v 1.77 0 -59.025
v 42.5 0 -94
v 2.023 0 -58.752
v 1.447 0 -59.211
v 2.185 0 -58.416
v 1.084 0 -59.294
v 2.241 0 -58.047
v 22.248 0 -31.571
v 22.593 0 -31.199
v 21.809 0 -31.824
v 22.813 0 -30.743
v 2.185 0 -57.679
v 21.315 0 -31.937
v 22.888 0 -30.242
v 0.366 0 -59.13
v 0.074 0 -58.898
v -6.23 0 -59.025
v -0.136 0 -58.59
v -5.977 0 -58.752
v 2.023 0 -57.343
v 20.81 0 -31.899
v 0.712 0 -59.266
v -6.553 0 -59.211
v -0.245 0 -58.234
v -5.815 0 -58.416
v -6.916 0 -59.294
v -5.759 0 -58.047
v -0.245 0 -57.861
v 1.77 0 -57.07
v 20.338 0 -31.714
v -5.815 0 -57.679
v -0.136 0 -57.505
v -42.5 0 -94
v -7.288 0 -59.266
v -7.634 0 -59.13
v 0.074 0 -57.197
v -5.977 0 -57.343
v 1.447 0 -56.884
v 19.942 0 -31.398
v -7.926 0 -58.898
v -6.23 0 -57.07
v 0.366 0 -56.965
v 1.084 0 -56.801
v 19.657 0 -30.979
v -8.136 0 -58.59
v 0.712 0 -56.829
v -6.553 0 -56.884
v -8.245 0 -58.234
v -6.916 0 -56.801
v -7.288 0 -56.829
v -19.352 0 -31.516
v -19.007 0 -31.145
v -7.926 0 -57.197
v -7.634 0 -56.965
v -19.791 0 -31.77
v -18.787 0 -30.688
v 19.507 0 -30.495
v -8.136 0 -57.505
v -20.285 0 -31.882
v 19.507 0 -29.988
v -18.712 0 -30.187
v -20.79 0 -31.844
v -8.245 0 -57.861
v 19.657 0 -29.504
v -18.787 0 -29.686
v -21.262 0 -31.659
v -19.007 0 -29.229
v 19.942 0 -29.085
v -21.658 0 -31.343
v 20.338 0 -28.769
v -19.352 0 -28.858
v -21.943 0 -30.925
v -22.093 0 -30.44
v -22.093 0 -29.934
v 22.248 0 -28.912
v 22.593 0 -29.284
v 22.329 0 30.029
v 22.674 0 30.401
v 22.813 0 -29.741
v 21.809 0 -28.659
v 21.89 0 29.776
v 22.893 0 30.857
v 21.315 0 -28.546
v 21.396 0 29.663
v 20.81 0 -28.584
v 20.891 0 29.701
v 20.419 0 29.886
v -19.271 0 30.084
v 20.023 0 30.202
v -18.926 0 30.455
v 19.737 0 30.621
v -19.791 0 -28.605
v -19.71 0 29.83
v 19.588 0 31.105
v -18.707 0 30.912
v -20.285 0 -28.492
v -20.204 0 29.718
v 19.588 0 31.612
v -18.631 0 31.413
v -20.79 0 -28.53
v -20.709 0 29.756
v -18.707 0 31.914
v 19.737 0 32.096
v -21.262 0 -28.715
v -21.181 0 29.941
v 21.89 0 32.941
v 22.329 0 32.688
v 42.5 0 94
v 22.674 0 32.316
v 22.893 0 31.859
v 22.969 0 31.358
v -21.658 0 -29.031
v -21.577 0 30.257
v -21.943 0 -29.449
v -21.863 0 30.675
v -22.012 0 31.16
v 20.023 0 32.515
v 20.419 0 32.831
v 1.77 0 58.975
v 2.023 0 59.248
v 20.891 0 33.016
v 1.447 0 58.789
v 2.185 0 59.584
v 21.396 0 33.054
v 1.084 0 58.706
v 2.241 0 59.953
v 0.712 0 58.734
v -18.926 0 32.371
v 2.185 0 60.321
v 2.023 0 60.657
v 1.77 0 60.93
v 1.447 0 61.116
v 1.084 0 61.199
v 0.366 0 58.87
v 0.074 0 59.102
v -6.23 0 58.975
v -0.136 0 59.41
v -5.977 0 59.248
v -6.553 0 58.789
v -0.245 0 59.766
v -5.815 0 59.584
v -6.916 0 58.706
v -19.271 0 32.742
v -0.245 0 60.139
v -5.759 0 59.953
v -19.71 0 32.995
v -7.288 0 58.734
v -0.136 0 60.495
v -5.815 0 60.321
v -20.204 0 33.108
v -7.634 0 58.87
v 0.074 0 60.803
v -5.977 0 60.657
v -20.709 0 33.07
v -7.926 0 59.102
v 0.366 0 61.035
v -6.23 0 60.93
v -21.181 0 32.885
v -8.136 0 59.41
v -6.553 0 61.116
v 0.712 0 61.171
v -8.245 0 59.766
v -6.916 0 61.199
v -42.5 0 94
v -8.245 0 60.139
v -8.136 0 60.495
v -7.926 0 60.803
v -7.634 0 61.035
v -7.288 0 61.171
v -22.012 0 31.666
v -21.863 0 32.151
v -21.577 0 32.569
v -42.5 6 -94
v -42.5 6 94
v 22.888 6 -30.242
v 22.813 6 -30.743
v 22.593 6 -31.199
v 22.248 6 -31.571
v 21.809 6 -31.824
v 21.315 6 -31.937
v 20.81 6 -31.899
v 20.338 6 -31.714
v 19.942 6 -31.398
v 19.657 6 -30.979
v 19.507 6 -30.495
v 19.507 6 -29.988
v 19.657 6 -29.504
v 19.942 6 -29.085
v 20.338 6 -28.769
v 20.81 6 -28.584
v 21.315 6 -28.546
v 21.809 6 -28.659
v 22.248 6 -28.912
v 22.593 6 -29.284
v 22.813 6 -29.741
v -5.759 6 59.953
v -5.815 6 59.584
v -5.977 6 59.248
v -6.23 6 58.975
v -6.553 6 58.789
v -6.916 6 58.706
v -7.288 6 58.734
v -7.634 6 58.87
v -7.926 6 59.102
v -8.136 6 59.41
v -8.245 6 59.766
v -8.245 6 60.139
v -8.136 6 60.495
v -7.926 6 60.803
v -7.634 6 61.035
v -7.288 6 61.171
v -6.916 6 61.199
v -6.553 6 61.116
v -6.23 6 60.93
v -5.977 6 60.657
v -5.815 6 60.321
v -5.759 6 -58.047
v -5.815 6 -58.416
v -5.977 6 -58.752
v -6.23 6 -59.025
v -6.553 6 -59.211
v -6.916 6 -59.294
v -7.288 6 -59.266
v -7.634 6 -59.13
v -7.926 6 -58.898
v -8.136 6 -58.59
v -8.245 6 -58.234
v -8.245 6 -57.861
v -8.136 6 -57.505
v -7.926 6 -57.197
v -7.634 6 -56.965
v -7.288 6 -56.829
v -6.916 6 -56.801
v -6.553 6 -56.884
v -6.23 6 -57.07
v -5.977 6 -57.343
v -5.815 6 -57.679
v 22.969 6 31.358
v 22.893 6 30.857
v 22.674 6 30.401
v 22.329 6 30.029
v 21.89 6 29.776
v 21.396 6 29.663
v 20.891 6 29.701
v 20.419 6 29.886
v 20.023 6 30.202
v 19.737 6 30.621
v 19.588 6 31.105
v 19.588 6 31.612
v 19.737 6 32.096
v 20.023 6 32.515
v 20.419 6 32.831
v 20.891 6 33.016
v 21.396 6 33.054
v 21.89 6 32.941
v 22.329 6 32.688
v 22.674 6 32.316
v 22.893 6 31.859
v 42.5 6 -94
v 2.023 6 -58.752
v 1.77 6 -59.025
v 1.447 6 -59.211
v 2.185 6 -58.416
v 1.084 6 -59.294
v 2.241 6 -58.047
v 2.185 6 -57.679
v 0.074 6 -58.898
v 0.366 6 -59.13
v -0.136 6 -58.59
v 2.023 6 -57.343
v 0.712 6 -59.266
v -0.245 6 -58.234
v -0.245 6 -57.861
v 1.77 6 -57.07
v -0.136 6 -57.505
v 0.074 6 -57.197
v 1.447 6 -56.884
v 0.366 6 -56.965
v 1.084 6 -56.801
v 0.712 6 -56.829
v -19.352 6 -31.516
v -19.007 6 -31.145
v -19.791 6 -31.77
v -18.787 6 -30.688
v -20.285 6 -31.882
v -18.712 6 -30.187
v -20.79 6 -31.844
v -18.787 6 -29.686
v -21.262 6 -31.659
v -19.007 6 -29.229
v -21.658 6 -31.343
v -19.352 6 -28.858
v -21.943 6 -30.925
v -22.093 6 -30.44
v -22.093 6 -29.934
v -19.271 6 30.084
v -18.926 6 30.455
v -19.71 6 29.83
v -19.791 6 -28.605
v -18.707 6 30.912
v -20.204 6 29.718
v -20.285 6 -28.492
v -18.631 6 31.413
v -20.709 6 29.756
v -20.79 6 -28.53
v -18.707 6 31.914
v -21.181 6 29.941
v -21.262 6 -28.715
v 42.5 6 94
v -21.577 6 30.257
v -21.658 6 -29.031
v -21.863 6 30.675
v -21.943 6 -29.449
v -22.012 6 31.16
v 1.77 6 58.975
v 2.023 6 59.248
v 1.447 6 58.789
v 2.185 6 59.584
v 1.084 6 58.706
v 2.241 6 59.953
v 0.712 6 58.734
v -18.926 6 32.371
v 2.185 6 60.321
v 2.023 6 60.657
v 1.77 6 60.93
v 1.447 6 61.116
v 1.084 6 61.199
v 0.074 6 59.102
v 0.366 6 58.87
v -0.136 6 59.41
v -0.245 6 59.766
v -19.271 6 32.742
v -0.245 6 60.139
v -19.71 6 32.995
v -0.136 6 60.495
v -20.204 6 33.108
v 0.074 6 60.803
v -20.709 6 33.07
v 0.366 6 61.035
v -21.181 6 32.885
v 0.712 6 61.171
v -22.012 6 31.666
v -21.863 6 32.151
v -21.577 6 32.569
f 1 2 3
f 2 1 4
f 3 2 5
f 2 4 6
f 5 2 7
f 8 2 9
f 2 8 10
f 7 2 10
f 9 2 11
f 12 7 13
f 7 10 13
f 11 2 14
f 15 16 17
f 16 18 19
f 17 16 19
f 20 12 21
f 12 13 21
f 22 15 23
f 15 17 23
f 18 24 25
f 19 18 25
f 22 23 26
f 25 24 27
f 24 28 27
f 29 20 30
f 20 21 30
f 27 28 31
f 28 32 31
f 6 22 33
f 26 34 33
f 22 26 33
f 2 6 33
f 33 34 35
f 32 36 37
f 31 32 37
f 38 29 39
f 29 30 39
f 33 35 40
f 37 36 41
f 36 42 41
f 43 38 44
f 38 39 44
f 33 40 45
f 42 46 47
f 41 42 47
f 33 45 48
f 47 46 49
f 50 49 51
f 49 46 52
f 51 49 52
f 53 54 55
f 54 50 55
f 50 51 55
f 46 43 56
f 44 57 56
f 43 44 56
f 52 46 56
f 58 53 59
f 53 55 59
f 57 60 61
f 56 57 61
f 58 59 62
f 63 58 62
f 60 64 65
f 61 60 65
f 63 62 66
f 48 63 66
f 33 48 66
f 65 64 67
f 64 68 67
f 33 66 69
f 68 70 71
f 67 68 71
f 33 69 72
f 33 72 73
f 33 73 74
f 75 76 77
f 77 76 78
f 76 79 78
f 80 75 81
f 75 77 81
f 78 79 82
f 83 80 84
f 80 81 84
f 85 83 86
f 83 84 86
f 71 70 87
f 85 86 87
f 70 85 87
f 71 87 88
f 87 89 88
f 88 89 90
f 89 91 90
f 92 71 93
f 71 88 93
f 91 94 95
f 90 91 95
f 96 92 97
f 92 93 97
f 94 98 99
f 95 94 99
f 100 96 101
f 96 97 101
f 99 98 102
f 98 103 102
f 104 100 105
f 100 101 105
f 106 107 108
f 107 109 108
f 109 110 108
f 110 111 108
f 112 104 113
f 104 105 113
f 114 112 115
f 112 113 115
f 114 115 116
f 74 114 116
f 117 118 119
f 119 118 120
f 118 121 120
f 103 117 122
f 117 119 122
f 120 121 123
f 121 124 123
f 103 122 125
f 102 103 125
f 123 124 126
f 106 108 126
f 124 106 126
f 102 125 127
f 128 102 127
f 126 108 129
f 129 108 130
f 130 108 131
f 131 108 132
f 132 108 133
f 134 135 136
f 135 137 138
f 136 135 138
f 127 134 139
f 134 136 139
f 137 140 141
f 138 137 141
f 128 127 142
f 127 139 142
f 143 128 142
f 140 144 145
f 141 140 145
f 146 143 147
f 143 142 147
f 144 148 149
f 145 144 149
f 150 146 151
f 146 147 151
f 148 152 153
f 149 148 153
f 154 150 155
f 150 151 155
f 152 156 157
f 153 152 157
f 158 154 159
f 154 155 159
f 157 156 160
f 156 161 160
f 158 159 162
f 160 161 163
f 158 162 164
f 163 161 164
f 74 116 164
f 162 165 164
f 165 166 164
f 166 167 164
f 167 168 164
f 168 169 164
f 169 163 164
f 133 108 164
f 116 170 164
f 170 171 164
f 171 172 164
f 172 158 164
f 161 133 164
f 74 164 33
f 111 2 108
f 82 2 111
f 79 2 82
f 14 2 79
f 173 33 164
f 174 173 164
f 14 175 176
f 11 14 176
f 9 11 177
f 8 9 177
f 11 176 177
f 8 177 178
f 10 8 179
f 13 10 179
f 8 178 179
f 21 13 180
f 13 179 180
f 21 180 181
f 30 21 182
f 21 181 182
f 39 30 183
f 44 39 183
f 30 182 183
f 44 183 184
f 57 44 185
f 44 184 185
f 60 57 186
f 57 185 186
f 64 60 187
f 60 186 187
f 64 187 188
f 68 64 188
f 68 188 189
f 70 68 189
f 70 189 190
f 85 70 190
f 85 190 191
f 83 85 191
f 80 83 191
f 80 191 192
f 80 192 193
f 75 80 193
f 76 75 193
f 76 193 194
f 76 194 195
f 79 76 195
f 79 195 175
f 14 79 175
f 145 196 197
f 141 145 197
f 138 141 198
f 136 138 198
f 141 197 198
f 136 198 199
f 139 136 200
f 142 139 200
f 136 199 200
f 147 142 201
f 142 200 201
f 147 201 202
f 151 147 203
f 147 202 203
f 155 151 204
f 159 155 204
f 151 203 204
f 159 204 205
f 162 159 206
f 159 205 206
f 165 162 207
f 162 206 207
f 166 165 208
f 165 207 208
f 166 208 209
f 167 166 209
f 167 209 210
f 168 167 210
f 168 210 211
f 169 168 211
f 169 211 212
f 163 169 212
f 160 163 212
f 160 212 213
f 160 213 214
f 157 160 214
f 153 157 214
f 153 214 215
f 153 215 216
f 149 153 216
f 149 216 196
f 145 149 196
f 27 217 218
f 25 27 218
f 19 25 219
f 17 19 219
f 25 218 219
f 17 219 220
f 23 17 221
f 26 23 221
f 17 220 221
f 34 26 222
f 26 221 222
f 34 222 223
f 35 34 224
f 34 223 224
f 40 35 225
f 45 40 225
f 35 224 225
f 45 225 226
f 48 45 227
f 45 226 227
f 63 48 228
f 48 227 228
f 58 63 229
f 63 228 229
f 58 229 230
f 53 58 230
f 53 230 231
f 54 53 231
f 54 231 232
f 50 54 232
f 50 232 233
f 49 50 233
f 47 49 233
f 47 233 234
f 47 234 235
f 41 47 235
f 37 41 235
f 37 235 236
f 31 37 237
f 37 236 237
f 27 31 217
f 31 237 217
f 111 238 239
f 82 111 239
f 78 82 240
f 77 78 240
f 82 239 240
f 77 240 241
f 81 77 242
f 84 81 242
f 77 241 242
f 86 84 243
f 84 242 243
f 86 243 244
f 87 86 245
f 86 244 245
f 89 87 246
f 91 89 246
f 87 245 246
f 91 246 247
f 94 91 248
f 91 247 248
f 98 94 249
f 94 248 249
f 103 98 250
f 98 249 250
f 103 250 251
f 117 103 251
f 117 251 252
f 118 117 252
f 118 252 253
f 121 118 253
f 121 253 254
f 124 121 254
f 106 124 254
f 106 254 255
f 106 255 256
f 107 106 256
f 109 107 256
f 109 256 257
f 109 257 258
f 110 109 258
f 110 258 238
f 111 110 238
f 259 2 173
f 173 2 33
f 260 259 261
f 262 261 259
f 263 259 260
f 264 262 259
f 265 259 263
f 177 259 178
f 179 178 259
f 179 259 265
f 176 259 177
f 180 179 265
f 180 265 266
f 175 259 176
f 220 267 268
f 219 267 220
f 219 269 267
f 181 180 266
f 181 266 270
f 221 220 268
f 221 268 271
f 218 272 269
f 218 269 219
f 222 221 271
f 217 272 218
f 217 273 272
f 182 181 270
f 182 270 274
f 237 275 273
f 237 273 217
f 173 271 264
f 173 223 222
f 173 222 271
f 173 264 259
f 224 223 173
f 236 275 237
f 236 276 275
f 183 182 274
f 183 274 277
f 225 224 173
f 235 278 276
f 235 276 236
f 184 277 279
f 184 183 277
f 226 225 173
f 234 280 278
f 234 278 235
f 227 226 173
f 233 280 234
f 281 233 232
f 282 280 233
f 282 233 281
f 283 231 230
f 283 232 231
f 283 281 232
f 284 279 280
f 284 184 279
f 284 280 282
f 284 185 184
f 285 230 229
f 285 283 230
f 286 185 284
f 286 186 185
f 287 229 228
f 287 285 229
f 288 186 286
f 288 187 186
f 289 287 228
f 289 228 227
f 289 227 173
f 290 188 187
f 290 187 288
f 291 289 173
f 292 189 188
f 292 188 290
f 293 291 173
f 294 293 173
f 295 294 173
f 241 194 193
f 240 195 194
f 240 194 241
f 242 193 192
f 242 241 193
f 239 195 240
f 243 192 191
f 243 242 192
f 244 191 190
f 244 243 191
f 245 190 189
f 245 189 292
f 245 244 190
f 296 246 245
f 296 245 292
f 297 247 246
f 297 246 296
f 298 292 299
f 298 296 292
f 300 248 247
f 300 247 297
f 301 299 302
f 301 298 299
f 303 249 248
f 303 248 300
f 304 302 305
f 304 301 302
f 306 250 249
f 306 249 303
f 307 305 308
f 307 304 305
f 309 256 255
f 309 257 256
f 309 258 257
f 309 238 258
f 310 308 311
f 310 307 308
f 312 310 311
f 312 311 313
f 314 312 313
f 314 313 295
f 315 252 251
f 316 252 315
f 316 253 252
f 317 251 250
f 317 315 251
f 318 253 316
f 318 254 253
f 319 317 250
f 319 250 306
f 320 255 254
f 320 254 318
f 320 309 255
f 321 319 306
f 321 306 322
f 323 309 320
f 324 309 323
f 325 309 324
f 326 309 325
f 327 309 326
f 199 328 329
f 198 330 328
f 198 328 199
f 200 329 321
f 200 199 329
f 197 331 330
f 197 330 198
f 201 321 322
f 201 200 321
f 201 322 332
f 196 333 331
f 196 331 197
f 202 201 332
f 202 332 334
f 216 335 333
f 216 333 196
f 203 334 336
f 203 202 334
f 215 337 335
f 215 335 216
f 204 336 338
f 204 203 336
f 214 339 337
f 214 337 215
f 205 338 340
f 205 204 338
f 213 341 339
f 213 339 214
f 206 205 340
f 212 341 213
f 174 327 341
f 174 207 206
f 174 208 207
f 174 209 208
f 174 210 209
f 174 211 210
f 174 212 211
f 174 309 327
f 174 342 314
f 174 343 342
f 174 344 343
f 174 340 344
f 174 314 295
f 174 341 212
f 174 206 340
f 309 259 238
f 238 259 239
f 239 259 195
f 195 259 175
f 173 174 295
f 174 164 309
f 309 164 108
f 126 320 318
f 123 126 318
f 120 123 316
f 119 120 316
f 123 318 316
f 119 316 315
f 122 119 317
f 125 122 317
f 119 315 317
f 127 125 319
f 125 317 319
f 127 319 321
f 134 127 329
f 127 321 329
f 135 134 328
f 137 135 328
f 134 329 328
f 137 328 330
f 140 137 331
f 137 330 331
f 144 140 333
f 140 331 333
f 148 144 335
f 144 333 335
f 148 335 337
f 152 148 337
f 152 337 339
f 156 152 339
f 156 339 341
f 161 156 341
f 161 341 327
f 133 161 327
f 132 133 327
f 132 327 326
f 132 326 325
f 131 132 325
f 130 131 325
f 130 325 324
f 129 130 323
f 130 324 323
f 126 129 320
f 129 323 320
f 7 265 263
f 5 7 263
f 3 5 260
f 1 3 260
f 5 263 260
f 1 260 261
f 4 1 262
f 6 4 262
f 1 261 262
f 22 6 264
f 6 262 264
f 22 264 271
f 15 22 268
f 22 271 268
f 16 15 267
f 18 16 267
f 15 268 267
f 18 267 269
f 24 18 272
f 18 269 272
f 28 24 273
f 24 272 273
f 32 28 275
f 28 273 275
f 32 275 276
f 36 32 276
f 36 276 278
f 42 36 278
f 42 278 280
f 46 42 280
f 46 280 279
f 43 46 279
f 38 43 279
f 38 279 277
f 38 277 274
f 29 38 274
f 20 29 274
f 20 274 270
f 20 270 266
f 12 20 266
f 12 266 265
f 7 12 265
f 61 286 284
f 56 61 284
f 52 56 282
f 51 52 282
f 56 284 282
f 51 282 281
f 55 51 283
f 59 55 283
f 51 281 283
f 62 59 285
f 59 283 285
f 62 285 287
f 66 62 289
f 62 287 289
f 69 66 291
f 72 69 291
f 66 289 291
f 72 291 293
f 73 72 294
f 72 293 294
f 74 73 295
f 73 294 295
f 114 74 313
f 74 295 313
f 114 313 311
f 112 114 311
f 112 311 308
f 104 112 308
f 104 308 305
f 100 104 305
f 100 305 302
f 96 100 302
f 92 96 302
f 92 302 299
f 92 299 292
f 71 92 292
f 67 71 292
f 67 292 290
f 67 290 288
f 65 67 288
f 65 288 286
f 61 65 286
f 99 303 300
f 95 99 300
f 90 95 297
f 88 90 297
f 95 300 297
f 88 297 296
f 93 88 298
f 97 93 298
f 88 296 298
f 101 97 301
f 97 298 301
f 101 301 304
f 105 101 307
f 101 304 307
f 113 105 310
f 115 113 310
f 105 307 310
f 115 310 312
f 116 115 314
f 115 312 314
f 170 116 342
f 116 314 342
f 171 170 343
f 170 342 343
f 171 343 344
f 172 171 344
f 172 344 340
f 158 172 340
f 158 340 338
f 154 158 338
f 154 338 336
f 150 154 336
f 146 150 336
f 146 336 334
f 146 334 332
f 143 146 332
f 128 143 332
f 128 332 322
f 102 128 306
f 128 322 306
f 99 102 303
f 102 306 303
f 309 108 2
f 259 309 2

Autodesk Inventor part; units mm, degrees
ref_plane "YZ Plane" through (0, 0, 0) normal (1, 0, 0) x (0, 1, 0)
ref_plane "XZ Plane" through (0, 0, 0) normal (0, 1, 0) x (-1, 0, 0)
ref_plane "XY Plane" through (0, 0, 0) normal (0, 0, 1) x (1, 0, 0)
ref_plane "작업 평면1" through (-11.501, -90.6951, 25.5) normal (0, 0, 1) x (0, 1, 0)
ref_plane "작업 평면2" through (-154.4039, 73.8066, -132.8958) normal (0, 0, 1) x (0, 1, 0)
sketch "스케치12" plane through (0, 0, 0) normal (0, 1, 0) x (-1, 0, 0)
  line L0 (-42.5, -94) -> (42.5, -94)
  line L1 (42.5, -94) -> (42.5, 94)
  line L2 (42.5, 94) -> (-42.5, 94)
  line L3 (-42.5, 94) -> (-42.5, -94)
  line L4 (-42.5, -94) -> (42.5, 94) construction
  line L5 (42.5, -94) -> (-42.5, 94) construction
  point P0 (0, 0)
  dimension "d71" = 85
  dimension "d72" = 188
extrude "돌출11" add sketch "스케치12" along normal blind 6
sketch "스케치15" plane through (0, 6, 0) normal (0, 1, 0) x (1, 0, 0)
  circle A0 centre (0.9906, -59.9526) radius 1.25 projected
  circle A1 centre (-7.0094, -59.9526) radius 1.25 projected
  line L0 (-13.0094, -54.9526) -> (6.9906, -54.9526) projected
  line L1 (-13.0094, -54.9526) -> (-13.0094, -64.9526) projected
  line L2 (6.9906, -64.9526) -> (-13.0094, -64.9526) projected
  line L3 (6.9906, -54.9526) -> (6.9906, -64.9526) projected
  circle A2 centre (-7.0094, 58.0474) radius 1.25 projected
  circle A3 centre (0.9906, 58.0474) radius 1.25 projected
  line L4 (6.9906, 53.0474) -> (-13.0094, 53.0474) projected
  line L5 (6.9906, 53.0474) -> (6.9906, 63.0474) projected
  line L6 (-13.0094, 63.0474) -> (6.9906, 63.0474) projected
  line L7 (-13.0094, 53.0474) -> (-13.0094, 63.0474) projected
  point P0 (0, 0)
extrude "돌출14" cut sketch "스케치15" against normal blind 10 contours A0 | A1 | A2 | A3
sketch "스케치16" plane through (0, 6, 0) normal (0, 1, 0) x (1, 0, 0)
  circle A0 centre (-20.331, -31.4129) radius 1.6 projected
  circle A1 centre (-20.4117, 30.1871) radius 1.6 projected
  circle A2 centre (21.269, -31.3584) radius 1.6 projected
  circle A3 centre (21.1883, 30.2416) radius 1.6 projected
  line L0 (-24.6171, 34.3816) -> (-24.5254, -35.6184) projected
  line L1 (-24.5254, -35.6184) -> (25.4745, -35.5529) projected
  line L2 (25.4745, -35.5529) -> (25.3828, 34.4471) projected
  line L3 (25.3828, 34.4471) -> (-24.6171, 34.3816) projected
  line L4 (-3.012, -16.0318) -> (-3.013, -15.2211) projected
  line L5 (-3.013, -15.2211) -> (2.3653, -15.2141) projected
  line L6 (2.3653, -15.2141) -> (2.3626, -13.1675) projected
  line L7 (2.3626, -13.1675) -> (3.0843, -13.1666) projected
  line L8 (3.0843, -13.1666) -> (3.0907, -18.0703) projected
  line L9 (3.0907, -18.0703) -> (2.369, -18.0713) projected
  line L10 (2.369, -18.0713) -> (2.3663, -16.0248) projected
  line L11 (2.3663, -16.0248) -> (-3.012, -16.0318) projected
  spline S0 degree 2 poles (-2.5863, -8.9228) (-2.8733, -8.6315) (-3.1512, -7.8607) (-3.1519, -7.2972) knots 0 0 0 1 2 2 2 projected
  spline S1 degree 2 poles (-3.1519, -7.2972) (-3.1526, -6.7584) (-2.8719, -5.9572) (-2.5905, -5.6751) knots 0 0 0 1 2 2 2 projected
  spline S2 degree 2 poles (-2.5905, -5.6751) (-2.2746, -5.3534) (-1.3851, -5.0902) (-0.7326, -5.0893) knots 0 0 0 1 2 2 2 projected
  line L12 (-0.7326, -5.0893) -> (3.0737, -5.0844) projected
  line L13 (3.0737, -5.0844) -> (3.0748, -5.895) projected
  line L14 (3.0748, -5.895) -> (-0.7315, -5.9) projected
  spline S3 degree 2 poles (-0.7315, -5.9) (-1.1567, -5.9006) (-1.7299, -6.0101) (-1.9621, -6.1636) knots 0 0 0 1 2 2 2 projected
  spline S4 degree 2 poles (-1.9621, -6.1636) (-2.209, -6.3271) (-2.4604, -6.891) (-2.4599, -7.2963) knots 0 0 0 1 2 2 2 projected
  spline S5 degree 2 poles (-2.4599, -7.2963) (-2.4594, -7.6769) (-2.2065, -8.2698) (-1.9591, -8.4326) knots 0 0 0 1 2 2 2 projected
  spline S6 degree 2 poles (-1.9591, -8.4326) (-1.7266, -8.5855) (-1.1579, -8.6935) (-0.7477, -8.693) knots 0 0 0 1 2 2 2 projected
  line L15 (-0.7477, -8.693) -> (3.0784, -8.688) projected
  line L16 (3.0784, -8.688) -> (3.0795, -9.4987) projected
  line L17 (3.0795, -9.4987) -> (-0.7268, -9.5037) projected
  spline S7 degree 2 poles (-0.7268, -9.5037) (-1.3645, -9.5045) (-2.2744, -9.2487) (-2.5863, -8.9228) knots 0 0 0 1 2 2 2 projected
  line L18 (-2.4181, 6.0803) -> (-3.0409, 6.0794) projected
  line L19 (-3.0409, 6.0794) -> (-3.044, 8.4423) projected
  line L20 (-3.044, 8.4423) -> (-2.4212, 8.4431) projected
  line L21 (-2.4212, 8.4431) -> (-2.4201, 7.6671) projected
  line L22 (-2.4201, 7.6671) -> (2.4341, 7.6734) projected
  line L23 (2.4341, 7.6734) -> (2.4331, 8.4495) projected
  line L24 (2.4331, 8.4495) -> (3.056, 8.4503) projected
  line L25 (3.056, 8.4503) -> (3.0591, 6.0874) projected
  line L26 (3.0591, 6.0874) -> (2.4362, 6.0866) projected
  line L27 (2.4362, 6.0866) -> (2.4352, 6.8627) projected
  line L28 (2.4352, 6.8627) -> (-2.4191, 6.8564) projected
  line L29 (-2.4191, 6.8564) -> (-2.4181, 6.0803) projected
  spline S8 degree 2 poles (-2.9765, 9.7722) (-3.0659, 10.039) (-3.1555, 10.4936) (-3.1559, 10.8594) knots 0 0 0 1 2 2 2 projected
  spline S9 degree 2 poles (-3.1559, 10.8594) (-3.1567, 11.4526) (-2.7576, 12.4566) (-2.3577, 12.823) knots 0 0 0 1 2 2 2 projected
  spline S10 degree 2 poles (-2.3577, 12.823) (-1.9627, 13.1893) (-0.7769, 13.5913) (-0.0057, 13.5923) knots 0 0 0 1 2 2 2 projected
  spline S11 degree 2 poles (-0.0057, 13.5923) (0.7605, 13.5933) (1.898, 13.2042) (2.3186, 12.834) knots 0 0 0 1 2 2 2 projected
  spline S12 degree 2 poles (2.3186, 12.834) (2.7294, 12.4688) (3.1608, 11.4708) (3.1616, 10.8529) knots 0 0 0 1 2 2 2 projected
  spline S13 degree 2 poles (3.1616, 10.8529) (3.162, 10.5464) (3.0737, 10.0075) (3.0048, 9.78) knots 0 0 0 1 2 2 2 projected
  spline S14 degree 2 poles (3.0048, 9.78) (2.9408, 9.5822) (2.7584, 9.1716) (2.65, 8.9688) knots 0 0 0 1 2 2 2 projected
  line L30 (2.65, 8.9688) -> (1.6712, 8.9675) projected
  line L31 (1.6712, 8.9675) -> (1.6711, 9.0318) projected
  spline S15 degree 2 poles (1.6711, 9.0318) (1.7698, 9.1407) (2.0462, 9.4772) (2.1794, 9.7196) knots 0 0 0 1 2 2 2 projected
  spline S16 degree 2 poles (2.1794, 9.7196) (2.3076, 9.9521) (2.47, 10.501) (2.4695, 10.8569) knots 0 0 0 1 2 2 2 projected
  spline S17 degree 2 poles (2.4695, 10.8569) (2.469, 11.2474) (2.1468, 11.944) (1.84, 12.2056) knots 0 0 0 1 2 2 2 projected
  spline S18 degree 2 poles (1.84, 12.2056) (1.5282, 12.4623) (0.5837, 12.7477) (-0.0046, 12.747) knots 0 0 0 1 2 2 2 projected
  spline S19 degree 2 poles (-0.0046, 12.747) (-0.6324, 12.7461) (-1.5366, 12.4434) (-1.8477, 12.181) knots 0 0 0 1 2 2 2 projected
  spline S20 degree 2 poles (-1.8477, 12.181) (-2.1489, 11.9236) (-2.4545, 11.2361) (-2.454, 10.8505) knots 0 0 0 1 2 2 2 projected
  spline S21 degree 2 poles (-2.454, 10.8505) (-2.4535, 10.4995) (-2.2797, 9.9016) (-2.1509, 9.6694) knots 0 0 0 1 2 2 2 projected
  spline S22 degree 2 poles (-2.1509, 9.6694) (-2.0221, 9.4472) (-1.7547, 9.1163) (-1.6607, 9.0225) knots 0 0 0 1 2 2 2 projected
  line L32 (-1.6607, 9.0225) -> (-1.6606, 8.9632) projected
  line L33 (-1.6606, 8.9632) -> (-2.6295, 8.9619) projected
  spline S23 degree 2 poles (-2.6295, 8.9619) (-2.7236, 9.1645) (-2.8971, 9.5202) (-2.9765, 9.7722) knots 0 0 0 1 2 2 2 projected
  line L34 (-0.3817, 2.5287) -> (-3.0334, 0.3551) projected
  line L35 (-3.0334, 0.3551) -> (-3.0348, 1.4081) projected
  line L36 (-3.0348, 1.4081) -> (-0.6102, 3.3391) projected
  line L37 (-0.6102, 3.3391) -> (-0.6114, 4.2684) projected
  line L38 (-0.6114, 4.2684) -> (-3.0385, 4.2653) projected
  line L39 (-3.0385, 4.2653) -> (-3.0396, 5.076) projected
  line L40 (-3.0396, 5.076) -> (3.0604, 5.084) projected
  line L41 (3.0604, 5.084) -> (3.0625, 3.512) projected
  spline S24 degree 2 poles (3.0625, 3.512) (3.0631, 2.988) (2.9504, 2.281) (2.7432, 1.9594) knots 0 0 0 1 2 2 2 projected
  spline S25 degree 2 poles (2.7432, 1.9594) (2.536, 1.6378) (1.8889, 1.2662) (1.4094, 1.2656) knots 0 0 0 1 2 2 2 projected
  spline S26 degree 2 poles (1.4094, 1.2656) (0.7421, 1.2647) (-0.1635, 1.9457) (-0.3817, 2.5287) knots 0 0 0 1 2 2 2 projected
  spline S27 degree 2 poles (-2.959, -3.5994) (-3.0484, -3.3326) (-3.1379, -2.8779) (-3.1384, -2.5121) knots 0 0 0 1 2 2 2 projected
  spline S28 degree 2 poles (-3.1384, -2.5121) (-3.1392, -1.9189) (-2.7401, -0.9149) (-2.3402, -0.5486) knots 0 0 0 1 2 2 2 projected
  spline S29 degree 2 poles (-2.3402, -0.5486) (-1.9452, -0.1823) (-0.7593, 0.2197) (0.0118, 0.2207) knots 0 0 0 1 2 2 2 projected
  spline S30 degree 2 poles (0.0118, 0.2207) (0.778, 0.2217) (1.9155, -0.1673) (2.3362, -0.5375) knots 0 0 0 1 2 2 2 projected
  spline S31 degree 2 poles (2.3362, -0.5375) (2.7469, -0.9028) (3.1783, -1.9007) (3.1791, -2.5187) knots 0 0 0 1 2 2 2 projected
  spline S32 degree 2 poles (3.1791, -2.5187) (3.1795, -2.8251) (3.0912, -3.3641) (3.0223, -3.5916) knots 0 0 0 1 2 2 2 projected
  spline S33 degree 2 poles (3.0223, -3.5916) (2.9583, -3.7894) (2.776, -4.1999) (2.6675, -4.4027) knots 0 0 0 1 2 2 2 projected
  line L42 (2.6675, -4.4027) -> (1.6887, -4.404) projected
  line L43 (1.6887, -4.404) -> (1.6886, -4.3397) projected
  spline S34 degree 2 poles (1.6886, -4.3397) (1.7873, -4.2309) (2.0637, -3.8943) (2.1969, -3.652) knots 0 0 0 1 2 2 2 projected
  spline S35 degree 2 poles (2.1969, -3.652) (2.3251, -3.4194) (2.4875, -2.8705) (2.487, -2.5146) knots 0 0 0 1 2 2 2 projected
  spline S36 degree 2 poles (2.487, -2.5146) (2.4865, -2.1241) (2.1643, -1.4275) (1.8575, -1.1659) knots 0 0 0 1 2 2 2 projected
  spline S37 degree 2 poles (1.8575, -1.1659) (1.5457, -0.9093) (0.6012, -0.6238) (0.0129, -0.6246) knots 0 0 0 1 2 2 2 projected
  spline S38 degree 2 poles (0.0129, -0.6246) (-0.6149, -0.6254) (-1.5191, -0.9281) (-1.8302, -1.1905) knots 0 0 0 1 2 2 2 projected
  spline S39 degree 2 poles (-1.8302, -1.1905) (-2.1314, -1.448) (-2.437, -2.1355) (-2.4365, -2.5211) knots 0 0 0 1 2 2 2 projected
  spline S40 degree 2 poles (-2.4365, -2.5211) (-2.436, -2.872) (-2.2622, -3.4699) (-2.1334, -3.7021) knots 0 0 0 1 2 2 2 projected
  spline S41 degree 2 poles (-2.1334, -3.7021) (-2.0046, -3.9244) (-1.7372, -4.2552) (-1.6431, -4.349) knots 0 0 0 1 2 2 2 projected
  line L44 (-1.6431, -4.349) -> (-1.6431, -4.4084) projected
  line L45 (-1.6431, -4.4084) -> (-2.6119, -4.4096) projected
  spline S42 degree 2 poles (-2.6119, -4.4096) (-2.7061, -4.2071) (-2.8796, -3.8514) (-2.959, -3.5994) knots 0 0 0 1 2 2 2 projected
  line L46 (-2.3933, -12.7931) -> (-3.0162, -12.794) projected
  line L47 (-3.0162, -12.794) -> (-3.0193, -10.4311) projected
  line L48 (-3.0193, -10.4311) -> (-2.3964, -10.4303) projected
  line L49 (-2.3964, -10.4303) -> (-2.3954, -11.2064) projected
  line L50 (-2.3954, -11.2064) -> (2.4589, -11.2) projected
  line L51 (2.4589, -11.2) -> (2.4579, -10.4239) projected
  line L52 (2.4579, -10.4239) -> (3.0807, -10.4231) projected
  line L53 (3.0807, -10.4231) -> (3.0838, -12.786) projected
  line L54 (3.0838, -12.786) -> (2.4609, -12.7868) projected
  line L55 (2.4609, -12.7868) -> (2.4599, -12.0107) projected
  line L56 (2.4599, -12.0107) -> (-2.3944, -12.017) projected
  line L57 (-2.3944, -12.017) -> (-2.3933, -12.7931) projected
  circle A4 centre (-20.331, -31.4129) radius 1.7
  circle A5 centre (-20.4117, 30.1871) radius 1.7
  circle A6 centre (21.1883, 30.2416) radius 1.7
  circle A7 centre (21.269, -31.3584) radius 1.7
  point P0 (0, 0)
  dimension "d81" = 0.1
  dimension "d82" = 0.1
  dimension "d83" = 0.1
  dimension "d84" = 0.1
extrude "돌출15" cut sketch "스케치16" against normal blind 10 contours A0 | A1 | A2 | A3 | A4 | A5 | A6 | A7
properties part number "12_CPY1" material "아크릴, 선명"
